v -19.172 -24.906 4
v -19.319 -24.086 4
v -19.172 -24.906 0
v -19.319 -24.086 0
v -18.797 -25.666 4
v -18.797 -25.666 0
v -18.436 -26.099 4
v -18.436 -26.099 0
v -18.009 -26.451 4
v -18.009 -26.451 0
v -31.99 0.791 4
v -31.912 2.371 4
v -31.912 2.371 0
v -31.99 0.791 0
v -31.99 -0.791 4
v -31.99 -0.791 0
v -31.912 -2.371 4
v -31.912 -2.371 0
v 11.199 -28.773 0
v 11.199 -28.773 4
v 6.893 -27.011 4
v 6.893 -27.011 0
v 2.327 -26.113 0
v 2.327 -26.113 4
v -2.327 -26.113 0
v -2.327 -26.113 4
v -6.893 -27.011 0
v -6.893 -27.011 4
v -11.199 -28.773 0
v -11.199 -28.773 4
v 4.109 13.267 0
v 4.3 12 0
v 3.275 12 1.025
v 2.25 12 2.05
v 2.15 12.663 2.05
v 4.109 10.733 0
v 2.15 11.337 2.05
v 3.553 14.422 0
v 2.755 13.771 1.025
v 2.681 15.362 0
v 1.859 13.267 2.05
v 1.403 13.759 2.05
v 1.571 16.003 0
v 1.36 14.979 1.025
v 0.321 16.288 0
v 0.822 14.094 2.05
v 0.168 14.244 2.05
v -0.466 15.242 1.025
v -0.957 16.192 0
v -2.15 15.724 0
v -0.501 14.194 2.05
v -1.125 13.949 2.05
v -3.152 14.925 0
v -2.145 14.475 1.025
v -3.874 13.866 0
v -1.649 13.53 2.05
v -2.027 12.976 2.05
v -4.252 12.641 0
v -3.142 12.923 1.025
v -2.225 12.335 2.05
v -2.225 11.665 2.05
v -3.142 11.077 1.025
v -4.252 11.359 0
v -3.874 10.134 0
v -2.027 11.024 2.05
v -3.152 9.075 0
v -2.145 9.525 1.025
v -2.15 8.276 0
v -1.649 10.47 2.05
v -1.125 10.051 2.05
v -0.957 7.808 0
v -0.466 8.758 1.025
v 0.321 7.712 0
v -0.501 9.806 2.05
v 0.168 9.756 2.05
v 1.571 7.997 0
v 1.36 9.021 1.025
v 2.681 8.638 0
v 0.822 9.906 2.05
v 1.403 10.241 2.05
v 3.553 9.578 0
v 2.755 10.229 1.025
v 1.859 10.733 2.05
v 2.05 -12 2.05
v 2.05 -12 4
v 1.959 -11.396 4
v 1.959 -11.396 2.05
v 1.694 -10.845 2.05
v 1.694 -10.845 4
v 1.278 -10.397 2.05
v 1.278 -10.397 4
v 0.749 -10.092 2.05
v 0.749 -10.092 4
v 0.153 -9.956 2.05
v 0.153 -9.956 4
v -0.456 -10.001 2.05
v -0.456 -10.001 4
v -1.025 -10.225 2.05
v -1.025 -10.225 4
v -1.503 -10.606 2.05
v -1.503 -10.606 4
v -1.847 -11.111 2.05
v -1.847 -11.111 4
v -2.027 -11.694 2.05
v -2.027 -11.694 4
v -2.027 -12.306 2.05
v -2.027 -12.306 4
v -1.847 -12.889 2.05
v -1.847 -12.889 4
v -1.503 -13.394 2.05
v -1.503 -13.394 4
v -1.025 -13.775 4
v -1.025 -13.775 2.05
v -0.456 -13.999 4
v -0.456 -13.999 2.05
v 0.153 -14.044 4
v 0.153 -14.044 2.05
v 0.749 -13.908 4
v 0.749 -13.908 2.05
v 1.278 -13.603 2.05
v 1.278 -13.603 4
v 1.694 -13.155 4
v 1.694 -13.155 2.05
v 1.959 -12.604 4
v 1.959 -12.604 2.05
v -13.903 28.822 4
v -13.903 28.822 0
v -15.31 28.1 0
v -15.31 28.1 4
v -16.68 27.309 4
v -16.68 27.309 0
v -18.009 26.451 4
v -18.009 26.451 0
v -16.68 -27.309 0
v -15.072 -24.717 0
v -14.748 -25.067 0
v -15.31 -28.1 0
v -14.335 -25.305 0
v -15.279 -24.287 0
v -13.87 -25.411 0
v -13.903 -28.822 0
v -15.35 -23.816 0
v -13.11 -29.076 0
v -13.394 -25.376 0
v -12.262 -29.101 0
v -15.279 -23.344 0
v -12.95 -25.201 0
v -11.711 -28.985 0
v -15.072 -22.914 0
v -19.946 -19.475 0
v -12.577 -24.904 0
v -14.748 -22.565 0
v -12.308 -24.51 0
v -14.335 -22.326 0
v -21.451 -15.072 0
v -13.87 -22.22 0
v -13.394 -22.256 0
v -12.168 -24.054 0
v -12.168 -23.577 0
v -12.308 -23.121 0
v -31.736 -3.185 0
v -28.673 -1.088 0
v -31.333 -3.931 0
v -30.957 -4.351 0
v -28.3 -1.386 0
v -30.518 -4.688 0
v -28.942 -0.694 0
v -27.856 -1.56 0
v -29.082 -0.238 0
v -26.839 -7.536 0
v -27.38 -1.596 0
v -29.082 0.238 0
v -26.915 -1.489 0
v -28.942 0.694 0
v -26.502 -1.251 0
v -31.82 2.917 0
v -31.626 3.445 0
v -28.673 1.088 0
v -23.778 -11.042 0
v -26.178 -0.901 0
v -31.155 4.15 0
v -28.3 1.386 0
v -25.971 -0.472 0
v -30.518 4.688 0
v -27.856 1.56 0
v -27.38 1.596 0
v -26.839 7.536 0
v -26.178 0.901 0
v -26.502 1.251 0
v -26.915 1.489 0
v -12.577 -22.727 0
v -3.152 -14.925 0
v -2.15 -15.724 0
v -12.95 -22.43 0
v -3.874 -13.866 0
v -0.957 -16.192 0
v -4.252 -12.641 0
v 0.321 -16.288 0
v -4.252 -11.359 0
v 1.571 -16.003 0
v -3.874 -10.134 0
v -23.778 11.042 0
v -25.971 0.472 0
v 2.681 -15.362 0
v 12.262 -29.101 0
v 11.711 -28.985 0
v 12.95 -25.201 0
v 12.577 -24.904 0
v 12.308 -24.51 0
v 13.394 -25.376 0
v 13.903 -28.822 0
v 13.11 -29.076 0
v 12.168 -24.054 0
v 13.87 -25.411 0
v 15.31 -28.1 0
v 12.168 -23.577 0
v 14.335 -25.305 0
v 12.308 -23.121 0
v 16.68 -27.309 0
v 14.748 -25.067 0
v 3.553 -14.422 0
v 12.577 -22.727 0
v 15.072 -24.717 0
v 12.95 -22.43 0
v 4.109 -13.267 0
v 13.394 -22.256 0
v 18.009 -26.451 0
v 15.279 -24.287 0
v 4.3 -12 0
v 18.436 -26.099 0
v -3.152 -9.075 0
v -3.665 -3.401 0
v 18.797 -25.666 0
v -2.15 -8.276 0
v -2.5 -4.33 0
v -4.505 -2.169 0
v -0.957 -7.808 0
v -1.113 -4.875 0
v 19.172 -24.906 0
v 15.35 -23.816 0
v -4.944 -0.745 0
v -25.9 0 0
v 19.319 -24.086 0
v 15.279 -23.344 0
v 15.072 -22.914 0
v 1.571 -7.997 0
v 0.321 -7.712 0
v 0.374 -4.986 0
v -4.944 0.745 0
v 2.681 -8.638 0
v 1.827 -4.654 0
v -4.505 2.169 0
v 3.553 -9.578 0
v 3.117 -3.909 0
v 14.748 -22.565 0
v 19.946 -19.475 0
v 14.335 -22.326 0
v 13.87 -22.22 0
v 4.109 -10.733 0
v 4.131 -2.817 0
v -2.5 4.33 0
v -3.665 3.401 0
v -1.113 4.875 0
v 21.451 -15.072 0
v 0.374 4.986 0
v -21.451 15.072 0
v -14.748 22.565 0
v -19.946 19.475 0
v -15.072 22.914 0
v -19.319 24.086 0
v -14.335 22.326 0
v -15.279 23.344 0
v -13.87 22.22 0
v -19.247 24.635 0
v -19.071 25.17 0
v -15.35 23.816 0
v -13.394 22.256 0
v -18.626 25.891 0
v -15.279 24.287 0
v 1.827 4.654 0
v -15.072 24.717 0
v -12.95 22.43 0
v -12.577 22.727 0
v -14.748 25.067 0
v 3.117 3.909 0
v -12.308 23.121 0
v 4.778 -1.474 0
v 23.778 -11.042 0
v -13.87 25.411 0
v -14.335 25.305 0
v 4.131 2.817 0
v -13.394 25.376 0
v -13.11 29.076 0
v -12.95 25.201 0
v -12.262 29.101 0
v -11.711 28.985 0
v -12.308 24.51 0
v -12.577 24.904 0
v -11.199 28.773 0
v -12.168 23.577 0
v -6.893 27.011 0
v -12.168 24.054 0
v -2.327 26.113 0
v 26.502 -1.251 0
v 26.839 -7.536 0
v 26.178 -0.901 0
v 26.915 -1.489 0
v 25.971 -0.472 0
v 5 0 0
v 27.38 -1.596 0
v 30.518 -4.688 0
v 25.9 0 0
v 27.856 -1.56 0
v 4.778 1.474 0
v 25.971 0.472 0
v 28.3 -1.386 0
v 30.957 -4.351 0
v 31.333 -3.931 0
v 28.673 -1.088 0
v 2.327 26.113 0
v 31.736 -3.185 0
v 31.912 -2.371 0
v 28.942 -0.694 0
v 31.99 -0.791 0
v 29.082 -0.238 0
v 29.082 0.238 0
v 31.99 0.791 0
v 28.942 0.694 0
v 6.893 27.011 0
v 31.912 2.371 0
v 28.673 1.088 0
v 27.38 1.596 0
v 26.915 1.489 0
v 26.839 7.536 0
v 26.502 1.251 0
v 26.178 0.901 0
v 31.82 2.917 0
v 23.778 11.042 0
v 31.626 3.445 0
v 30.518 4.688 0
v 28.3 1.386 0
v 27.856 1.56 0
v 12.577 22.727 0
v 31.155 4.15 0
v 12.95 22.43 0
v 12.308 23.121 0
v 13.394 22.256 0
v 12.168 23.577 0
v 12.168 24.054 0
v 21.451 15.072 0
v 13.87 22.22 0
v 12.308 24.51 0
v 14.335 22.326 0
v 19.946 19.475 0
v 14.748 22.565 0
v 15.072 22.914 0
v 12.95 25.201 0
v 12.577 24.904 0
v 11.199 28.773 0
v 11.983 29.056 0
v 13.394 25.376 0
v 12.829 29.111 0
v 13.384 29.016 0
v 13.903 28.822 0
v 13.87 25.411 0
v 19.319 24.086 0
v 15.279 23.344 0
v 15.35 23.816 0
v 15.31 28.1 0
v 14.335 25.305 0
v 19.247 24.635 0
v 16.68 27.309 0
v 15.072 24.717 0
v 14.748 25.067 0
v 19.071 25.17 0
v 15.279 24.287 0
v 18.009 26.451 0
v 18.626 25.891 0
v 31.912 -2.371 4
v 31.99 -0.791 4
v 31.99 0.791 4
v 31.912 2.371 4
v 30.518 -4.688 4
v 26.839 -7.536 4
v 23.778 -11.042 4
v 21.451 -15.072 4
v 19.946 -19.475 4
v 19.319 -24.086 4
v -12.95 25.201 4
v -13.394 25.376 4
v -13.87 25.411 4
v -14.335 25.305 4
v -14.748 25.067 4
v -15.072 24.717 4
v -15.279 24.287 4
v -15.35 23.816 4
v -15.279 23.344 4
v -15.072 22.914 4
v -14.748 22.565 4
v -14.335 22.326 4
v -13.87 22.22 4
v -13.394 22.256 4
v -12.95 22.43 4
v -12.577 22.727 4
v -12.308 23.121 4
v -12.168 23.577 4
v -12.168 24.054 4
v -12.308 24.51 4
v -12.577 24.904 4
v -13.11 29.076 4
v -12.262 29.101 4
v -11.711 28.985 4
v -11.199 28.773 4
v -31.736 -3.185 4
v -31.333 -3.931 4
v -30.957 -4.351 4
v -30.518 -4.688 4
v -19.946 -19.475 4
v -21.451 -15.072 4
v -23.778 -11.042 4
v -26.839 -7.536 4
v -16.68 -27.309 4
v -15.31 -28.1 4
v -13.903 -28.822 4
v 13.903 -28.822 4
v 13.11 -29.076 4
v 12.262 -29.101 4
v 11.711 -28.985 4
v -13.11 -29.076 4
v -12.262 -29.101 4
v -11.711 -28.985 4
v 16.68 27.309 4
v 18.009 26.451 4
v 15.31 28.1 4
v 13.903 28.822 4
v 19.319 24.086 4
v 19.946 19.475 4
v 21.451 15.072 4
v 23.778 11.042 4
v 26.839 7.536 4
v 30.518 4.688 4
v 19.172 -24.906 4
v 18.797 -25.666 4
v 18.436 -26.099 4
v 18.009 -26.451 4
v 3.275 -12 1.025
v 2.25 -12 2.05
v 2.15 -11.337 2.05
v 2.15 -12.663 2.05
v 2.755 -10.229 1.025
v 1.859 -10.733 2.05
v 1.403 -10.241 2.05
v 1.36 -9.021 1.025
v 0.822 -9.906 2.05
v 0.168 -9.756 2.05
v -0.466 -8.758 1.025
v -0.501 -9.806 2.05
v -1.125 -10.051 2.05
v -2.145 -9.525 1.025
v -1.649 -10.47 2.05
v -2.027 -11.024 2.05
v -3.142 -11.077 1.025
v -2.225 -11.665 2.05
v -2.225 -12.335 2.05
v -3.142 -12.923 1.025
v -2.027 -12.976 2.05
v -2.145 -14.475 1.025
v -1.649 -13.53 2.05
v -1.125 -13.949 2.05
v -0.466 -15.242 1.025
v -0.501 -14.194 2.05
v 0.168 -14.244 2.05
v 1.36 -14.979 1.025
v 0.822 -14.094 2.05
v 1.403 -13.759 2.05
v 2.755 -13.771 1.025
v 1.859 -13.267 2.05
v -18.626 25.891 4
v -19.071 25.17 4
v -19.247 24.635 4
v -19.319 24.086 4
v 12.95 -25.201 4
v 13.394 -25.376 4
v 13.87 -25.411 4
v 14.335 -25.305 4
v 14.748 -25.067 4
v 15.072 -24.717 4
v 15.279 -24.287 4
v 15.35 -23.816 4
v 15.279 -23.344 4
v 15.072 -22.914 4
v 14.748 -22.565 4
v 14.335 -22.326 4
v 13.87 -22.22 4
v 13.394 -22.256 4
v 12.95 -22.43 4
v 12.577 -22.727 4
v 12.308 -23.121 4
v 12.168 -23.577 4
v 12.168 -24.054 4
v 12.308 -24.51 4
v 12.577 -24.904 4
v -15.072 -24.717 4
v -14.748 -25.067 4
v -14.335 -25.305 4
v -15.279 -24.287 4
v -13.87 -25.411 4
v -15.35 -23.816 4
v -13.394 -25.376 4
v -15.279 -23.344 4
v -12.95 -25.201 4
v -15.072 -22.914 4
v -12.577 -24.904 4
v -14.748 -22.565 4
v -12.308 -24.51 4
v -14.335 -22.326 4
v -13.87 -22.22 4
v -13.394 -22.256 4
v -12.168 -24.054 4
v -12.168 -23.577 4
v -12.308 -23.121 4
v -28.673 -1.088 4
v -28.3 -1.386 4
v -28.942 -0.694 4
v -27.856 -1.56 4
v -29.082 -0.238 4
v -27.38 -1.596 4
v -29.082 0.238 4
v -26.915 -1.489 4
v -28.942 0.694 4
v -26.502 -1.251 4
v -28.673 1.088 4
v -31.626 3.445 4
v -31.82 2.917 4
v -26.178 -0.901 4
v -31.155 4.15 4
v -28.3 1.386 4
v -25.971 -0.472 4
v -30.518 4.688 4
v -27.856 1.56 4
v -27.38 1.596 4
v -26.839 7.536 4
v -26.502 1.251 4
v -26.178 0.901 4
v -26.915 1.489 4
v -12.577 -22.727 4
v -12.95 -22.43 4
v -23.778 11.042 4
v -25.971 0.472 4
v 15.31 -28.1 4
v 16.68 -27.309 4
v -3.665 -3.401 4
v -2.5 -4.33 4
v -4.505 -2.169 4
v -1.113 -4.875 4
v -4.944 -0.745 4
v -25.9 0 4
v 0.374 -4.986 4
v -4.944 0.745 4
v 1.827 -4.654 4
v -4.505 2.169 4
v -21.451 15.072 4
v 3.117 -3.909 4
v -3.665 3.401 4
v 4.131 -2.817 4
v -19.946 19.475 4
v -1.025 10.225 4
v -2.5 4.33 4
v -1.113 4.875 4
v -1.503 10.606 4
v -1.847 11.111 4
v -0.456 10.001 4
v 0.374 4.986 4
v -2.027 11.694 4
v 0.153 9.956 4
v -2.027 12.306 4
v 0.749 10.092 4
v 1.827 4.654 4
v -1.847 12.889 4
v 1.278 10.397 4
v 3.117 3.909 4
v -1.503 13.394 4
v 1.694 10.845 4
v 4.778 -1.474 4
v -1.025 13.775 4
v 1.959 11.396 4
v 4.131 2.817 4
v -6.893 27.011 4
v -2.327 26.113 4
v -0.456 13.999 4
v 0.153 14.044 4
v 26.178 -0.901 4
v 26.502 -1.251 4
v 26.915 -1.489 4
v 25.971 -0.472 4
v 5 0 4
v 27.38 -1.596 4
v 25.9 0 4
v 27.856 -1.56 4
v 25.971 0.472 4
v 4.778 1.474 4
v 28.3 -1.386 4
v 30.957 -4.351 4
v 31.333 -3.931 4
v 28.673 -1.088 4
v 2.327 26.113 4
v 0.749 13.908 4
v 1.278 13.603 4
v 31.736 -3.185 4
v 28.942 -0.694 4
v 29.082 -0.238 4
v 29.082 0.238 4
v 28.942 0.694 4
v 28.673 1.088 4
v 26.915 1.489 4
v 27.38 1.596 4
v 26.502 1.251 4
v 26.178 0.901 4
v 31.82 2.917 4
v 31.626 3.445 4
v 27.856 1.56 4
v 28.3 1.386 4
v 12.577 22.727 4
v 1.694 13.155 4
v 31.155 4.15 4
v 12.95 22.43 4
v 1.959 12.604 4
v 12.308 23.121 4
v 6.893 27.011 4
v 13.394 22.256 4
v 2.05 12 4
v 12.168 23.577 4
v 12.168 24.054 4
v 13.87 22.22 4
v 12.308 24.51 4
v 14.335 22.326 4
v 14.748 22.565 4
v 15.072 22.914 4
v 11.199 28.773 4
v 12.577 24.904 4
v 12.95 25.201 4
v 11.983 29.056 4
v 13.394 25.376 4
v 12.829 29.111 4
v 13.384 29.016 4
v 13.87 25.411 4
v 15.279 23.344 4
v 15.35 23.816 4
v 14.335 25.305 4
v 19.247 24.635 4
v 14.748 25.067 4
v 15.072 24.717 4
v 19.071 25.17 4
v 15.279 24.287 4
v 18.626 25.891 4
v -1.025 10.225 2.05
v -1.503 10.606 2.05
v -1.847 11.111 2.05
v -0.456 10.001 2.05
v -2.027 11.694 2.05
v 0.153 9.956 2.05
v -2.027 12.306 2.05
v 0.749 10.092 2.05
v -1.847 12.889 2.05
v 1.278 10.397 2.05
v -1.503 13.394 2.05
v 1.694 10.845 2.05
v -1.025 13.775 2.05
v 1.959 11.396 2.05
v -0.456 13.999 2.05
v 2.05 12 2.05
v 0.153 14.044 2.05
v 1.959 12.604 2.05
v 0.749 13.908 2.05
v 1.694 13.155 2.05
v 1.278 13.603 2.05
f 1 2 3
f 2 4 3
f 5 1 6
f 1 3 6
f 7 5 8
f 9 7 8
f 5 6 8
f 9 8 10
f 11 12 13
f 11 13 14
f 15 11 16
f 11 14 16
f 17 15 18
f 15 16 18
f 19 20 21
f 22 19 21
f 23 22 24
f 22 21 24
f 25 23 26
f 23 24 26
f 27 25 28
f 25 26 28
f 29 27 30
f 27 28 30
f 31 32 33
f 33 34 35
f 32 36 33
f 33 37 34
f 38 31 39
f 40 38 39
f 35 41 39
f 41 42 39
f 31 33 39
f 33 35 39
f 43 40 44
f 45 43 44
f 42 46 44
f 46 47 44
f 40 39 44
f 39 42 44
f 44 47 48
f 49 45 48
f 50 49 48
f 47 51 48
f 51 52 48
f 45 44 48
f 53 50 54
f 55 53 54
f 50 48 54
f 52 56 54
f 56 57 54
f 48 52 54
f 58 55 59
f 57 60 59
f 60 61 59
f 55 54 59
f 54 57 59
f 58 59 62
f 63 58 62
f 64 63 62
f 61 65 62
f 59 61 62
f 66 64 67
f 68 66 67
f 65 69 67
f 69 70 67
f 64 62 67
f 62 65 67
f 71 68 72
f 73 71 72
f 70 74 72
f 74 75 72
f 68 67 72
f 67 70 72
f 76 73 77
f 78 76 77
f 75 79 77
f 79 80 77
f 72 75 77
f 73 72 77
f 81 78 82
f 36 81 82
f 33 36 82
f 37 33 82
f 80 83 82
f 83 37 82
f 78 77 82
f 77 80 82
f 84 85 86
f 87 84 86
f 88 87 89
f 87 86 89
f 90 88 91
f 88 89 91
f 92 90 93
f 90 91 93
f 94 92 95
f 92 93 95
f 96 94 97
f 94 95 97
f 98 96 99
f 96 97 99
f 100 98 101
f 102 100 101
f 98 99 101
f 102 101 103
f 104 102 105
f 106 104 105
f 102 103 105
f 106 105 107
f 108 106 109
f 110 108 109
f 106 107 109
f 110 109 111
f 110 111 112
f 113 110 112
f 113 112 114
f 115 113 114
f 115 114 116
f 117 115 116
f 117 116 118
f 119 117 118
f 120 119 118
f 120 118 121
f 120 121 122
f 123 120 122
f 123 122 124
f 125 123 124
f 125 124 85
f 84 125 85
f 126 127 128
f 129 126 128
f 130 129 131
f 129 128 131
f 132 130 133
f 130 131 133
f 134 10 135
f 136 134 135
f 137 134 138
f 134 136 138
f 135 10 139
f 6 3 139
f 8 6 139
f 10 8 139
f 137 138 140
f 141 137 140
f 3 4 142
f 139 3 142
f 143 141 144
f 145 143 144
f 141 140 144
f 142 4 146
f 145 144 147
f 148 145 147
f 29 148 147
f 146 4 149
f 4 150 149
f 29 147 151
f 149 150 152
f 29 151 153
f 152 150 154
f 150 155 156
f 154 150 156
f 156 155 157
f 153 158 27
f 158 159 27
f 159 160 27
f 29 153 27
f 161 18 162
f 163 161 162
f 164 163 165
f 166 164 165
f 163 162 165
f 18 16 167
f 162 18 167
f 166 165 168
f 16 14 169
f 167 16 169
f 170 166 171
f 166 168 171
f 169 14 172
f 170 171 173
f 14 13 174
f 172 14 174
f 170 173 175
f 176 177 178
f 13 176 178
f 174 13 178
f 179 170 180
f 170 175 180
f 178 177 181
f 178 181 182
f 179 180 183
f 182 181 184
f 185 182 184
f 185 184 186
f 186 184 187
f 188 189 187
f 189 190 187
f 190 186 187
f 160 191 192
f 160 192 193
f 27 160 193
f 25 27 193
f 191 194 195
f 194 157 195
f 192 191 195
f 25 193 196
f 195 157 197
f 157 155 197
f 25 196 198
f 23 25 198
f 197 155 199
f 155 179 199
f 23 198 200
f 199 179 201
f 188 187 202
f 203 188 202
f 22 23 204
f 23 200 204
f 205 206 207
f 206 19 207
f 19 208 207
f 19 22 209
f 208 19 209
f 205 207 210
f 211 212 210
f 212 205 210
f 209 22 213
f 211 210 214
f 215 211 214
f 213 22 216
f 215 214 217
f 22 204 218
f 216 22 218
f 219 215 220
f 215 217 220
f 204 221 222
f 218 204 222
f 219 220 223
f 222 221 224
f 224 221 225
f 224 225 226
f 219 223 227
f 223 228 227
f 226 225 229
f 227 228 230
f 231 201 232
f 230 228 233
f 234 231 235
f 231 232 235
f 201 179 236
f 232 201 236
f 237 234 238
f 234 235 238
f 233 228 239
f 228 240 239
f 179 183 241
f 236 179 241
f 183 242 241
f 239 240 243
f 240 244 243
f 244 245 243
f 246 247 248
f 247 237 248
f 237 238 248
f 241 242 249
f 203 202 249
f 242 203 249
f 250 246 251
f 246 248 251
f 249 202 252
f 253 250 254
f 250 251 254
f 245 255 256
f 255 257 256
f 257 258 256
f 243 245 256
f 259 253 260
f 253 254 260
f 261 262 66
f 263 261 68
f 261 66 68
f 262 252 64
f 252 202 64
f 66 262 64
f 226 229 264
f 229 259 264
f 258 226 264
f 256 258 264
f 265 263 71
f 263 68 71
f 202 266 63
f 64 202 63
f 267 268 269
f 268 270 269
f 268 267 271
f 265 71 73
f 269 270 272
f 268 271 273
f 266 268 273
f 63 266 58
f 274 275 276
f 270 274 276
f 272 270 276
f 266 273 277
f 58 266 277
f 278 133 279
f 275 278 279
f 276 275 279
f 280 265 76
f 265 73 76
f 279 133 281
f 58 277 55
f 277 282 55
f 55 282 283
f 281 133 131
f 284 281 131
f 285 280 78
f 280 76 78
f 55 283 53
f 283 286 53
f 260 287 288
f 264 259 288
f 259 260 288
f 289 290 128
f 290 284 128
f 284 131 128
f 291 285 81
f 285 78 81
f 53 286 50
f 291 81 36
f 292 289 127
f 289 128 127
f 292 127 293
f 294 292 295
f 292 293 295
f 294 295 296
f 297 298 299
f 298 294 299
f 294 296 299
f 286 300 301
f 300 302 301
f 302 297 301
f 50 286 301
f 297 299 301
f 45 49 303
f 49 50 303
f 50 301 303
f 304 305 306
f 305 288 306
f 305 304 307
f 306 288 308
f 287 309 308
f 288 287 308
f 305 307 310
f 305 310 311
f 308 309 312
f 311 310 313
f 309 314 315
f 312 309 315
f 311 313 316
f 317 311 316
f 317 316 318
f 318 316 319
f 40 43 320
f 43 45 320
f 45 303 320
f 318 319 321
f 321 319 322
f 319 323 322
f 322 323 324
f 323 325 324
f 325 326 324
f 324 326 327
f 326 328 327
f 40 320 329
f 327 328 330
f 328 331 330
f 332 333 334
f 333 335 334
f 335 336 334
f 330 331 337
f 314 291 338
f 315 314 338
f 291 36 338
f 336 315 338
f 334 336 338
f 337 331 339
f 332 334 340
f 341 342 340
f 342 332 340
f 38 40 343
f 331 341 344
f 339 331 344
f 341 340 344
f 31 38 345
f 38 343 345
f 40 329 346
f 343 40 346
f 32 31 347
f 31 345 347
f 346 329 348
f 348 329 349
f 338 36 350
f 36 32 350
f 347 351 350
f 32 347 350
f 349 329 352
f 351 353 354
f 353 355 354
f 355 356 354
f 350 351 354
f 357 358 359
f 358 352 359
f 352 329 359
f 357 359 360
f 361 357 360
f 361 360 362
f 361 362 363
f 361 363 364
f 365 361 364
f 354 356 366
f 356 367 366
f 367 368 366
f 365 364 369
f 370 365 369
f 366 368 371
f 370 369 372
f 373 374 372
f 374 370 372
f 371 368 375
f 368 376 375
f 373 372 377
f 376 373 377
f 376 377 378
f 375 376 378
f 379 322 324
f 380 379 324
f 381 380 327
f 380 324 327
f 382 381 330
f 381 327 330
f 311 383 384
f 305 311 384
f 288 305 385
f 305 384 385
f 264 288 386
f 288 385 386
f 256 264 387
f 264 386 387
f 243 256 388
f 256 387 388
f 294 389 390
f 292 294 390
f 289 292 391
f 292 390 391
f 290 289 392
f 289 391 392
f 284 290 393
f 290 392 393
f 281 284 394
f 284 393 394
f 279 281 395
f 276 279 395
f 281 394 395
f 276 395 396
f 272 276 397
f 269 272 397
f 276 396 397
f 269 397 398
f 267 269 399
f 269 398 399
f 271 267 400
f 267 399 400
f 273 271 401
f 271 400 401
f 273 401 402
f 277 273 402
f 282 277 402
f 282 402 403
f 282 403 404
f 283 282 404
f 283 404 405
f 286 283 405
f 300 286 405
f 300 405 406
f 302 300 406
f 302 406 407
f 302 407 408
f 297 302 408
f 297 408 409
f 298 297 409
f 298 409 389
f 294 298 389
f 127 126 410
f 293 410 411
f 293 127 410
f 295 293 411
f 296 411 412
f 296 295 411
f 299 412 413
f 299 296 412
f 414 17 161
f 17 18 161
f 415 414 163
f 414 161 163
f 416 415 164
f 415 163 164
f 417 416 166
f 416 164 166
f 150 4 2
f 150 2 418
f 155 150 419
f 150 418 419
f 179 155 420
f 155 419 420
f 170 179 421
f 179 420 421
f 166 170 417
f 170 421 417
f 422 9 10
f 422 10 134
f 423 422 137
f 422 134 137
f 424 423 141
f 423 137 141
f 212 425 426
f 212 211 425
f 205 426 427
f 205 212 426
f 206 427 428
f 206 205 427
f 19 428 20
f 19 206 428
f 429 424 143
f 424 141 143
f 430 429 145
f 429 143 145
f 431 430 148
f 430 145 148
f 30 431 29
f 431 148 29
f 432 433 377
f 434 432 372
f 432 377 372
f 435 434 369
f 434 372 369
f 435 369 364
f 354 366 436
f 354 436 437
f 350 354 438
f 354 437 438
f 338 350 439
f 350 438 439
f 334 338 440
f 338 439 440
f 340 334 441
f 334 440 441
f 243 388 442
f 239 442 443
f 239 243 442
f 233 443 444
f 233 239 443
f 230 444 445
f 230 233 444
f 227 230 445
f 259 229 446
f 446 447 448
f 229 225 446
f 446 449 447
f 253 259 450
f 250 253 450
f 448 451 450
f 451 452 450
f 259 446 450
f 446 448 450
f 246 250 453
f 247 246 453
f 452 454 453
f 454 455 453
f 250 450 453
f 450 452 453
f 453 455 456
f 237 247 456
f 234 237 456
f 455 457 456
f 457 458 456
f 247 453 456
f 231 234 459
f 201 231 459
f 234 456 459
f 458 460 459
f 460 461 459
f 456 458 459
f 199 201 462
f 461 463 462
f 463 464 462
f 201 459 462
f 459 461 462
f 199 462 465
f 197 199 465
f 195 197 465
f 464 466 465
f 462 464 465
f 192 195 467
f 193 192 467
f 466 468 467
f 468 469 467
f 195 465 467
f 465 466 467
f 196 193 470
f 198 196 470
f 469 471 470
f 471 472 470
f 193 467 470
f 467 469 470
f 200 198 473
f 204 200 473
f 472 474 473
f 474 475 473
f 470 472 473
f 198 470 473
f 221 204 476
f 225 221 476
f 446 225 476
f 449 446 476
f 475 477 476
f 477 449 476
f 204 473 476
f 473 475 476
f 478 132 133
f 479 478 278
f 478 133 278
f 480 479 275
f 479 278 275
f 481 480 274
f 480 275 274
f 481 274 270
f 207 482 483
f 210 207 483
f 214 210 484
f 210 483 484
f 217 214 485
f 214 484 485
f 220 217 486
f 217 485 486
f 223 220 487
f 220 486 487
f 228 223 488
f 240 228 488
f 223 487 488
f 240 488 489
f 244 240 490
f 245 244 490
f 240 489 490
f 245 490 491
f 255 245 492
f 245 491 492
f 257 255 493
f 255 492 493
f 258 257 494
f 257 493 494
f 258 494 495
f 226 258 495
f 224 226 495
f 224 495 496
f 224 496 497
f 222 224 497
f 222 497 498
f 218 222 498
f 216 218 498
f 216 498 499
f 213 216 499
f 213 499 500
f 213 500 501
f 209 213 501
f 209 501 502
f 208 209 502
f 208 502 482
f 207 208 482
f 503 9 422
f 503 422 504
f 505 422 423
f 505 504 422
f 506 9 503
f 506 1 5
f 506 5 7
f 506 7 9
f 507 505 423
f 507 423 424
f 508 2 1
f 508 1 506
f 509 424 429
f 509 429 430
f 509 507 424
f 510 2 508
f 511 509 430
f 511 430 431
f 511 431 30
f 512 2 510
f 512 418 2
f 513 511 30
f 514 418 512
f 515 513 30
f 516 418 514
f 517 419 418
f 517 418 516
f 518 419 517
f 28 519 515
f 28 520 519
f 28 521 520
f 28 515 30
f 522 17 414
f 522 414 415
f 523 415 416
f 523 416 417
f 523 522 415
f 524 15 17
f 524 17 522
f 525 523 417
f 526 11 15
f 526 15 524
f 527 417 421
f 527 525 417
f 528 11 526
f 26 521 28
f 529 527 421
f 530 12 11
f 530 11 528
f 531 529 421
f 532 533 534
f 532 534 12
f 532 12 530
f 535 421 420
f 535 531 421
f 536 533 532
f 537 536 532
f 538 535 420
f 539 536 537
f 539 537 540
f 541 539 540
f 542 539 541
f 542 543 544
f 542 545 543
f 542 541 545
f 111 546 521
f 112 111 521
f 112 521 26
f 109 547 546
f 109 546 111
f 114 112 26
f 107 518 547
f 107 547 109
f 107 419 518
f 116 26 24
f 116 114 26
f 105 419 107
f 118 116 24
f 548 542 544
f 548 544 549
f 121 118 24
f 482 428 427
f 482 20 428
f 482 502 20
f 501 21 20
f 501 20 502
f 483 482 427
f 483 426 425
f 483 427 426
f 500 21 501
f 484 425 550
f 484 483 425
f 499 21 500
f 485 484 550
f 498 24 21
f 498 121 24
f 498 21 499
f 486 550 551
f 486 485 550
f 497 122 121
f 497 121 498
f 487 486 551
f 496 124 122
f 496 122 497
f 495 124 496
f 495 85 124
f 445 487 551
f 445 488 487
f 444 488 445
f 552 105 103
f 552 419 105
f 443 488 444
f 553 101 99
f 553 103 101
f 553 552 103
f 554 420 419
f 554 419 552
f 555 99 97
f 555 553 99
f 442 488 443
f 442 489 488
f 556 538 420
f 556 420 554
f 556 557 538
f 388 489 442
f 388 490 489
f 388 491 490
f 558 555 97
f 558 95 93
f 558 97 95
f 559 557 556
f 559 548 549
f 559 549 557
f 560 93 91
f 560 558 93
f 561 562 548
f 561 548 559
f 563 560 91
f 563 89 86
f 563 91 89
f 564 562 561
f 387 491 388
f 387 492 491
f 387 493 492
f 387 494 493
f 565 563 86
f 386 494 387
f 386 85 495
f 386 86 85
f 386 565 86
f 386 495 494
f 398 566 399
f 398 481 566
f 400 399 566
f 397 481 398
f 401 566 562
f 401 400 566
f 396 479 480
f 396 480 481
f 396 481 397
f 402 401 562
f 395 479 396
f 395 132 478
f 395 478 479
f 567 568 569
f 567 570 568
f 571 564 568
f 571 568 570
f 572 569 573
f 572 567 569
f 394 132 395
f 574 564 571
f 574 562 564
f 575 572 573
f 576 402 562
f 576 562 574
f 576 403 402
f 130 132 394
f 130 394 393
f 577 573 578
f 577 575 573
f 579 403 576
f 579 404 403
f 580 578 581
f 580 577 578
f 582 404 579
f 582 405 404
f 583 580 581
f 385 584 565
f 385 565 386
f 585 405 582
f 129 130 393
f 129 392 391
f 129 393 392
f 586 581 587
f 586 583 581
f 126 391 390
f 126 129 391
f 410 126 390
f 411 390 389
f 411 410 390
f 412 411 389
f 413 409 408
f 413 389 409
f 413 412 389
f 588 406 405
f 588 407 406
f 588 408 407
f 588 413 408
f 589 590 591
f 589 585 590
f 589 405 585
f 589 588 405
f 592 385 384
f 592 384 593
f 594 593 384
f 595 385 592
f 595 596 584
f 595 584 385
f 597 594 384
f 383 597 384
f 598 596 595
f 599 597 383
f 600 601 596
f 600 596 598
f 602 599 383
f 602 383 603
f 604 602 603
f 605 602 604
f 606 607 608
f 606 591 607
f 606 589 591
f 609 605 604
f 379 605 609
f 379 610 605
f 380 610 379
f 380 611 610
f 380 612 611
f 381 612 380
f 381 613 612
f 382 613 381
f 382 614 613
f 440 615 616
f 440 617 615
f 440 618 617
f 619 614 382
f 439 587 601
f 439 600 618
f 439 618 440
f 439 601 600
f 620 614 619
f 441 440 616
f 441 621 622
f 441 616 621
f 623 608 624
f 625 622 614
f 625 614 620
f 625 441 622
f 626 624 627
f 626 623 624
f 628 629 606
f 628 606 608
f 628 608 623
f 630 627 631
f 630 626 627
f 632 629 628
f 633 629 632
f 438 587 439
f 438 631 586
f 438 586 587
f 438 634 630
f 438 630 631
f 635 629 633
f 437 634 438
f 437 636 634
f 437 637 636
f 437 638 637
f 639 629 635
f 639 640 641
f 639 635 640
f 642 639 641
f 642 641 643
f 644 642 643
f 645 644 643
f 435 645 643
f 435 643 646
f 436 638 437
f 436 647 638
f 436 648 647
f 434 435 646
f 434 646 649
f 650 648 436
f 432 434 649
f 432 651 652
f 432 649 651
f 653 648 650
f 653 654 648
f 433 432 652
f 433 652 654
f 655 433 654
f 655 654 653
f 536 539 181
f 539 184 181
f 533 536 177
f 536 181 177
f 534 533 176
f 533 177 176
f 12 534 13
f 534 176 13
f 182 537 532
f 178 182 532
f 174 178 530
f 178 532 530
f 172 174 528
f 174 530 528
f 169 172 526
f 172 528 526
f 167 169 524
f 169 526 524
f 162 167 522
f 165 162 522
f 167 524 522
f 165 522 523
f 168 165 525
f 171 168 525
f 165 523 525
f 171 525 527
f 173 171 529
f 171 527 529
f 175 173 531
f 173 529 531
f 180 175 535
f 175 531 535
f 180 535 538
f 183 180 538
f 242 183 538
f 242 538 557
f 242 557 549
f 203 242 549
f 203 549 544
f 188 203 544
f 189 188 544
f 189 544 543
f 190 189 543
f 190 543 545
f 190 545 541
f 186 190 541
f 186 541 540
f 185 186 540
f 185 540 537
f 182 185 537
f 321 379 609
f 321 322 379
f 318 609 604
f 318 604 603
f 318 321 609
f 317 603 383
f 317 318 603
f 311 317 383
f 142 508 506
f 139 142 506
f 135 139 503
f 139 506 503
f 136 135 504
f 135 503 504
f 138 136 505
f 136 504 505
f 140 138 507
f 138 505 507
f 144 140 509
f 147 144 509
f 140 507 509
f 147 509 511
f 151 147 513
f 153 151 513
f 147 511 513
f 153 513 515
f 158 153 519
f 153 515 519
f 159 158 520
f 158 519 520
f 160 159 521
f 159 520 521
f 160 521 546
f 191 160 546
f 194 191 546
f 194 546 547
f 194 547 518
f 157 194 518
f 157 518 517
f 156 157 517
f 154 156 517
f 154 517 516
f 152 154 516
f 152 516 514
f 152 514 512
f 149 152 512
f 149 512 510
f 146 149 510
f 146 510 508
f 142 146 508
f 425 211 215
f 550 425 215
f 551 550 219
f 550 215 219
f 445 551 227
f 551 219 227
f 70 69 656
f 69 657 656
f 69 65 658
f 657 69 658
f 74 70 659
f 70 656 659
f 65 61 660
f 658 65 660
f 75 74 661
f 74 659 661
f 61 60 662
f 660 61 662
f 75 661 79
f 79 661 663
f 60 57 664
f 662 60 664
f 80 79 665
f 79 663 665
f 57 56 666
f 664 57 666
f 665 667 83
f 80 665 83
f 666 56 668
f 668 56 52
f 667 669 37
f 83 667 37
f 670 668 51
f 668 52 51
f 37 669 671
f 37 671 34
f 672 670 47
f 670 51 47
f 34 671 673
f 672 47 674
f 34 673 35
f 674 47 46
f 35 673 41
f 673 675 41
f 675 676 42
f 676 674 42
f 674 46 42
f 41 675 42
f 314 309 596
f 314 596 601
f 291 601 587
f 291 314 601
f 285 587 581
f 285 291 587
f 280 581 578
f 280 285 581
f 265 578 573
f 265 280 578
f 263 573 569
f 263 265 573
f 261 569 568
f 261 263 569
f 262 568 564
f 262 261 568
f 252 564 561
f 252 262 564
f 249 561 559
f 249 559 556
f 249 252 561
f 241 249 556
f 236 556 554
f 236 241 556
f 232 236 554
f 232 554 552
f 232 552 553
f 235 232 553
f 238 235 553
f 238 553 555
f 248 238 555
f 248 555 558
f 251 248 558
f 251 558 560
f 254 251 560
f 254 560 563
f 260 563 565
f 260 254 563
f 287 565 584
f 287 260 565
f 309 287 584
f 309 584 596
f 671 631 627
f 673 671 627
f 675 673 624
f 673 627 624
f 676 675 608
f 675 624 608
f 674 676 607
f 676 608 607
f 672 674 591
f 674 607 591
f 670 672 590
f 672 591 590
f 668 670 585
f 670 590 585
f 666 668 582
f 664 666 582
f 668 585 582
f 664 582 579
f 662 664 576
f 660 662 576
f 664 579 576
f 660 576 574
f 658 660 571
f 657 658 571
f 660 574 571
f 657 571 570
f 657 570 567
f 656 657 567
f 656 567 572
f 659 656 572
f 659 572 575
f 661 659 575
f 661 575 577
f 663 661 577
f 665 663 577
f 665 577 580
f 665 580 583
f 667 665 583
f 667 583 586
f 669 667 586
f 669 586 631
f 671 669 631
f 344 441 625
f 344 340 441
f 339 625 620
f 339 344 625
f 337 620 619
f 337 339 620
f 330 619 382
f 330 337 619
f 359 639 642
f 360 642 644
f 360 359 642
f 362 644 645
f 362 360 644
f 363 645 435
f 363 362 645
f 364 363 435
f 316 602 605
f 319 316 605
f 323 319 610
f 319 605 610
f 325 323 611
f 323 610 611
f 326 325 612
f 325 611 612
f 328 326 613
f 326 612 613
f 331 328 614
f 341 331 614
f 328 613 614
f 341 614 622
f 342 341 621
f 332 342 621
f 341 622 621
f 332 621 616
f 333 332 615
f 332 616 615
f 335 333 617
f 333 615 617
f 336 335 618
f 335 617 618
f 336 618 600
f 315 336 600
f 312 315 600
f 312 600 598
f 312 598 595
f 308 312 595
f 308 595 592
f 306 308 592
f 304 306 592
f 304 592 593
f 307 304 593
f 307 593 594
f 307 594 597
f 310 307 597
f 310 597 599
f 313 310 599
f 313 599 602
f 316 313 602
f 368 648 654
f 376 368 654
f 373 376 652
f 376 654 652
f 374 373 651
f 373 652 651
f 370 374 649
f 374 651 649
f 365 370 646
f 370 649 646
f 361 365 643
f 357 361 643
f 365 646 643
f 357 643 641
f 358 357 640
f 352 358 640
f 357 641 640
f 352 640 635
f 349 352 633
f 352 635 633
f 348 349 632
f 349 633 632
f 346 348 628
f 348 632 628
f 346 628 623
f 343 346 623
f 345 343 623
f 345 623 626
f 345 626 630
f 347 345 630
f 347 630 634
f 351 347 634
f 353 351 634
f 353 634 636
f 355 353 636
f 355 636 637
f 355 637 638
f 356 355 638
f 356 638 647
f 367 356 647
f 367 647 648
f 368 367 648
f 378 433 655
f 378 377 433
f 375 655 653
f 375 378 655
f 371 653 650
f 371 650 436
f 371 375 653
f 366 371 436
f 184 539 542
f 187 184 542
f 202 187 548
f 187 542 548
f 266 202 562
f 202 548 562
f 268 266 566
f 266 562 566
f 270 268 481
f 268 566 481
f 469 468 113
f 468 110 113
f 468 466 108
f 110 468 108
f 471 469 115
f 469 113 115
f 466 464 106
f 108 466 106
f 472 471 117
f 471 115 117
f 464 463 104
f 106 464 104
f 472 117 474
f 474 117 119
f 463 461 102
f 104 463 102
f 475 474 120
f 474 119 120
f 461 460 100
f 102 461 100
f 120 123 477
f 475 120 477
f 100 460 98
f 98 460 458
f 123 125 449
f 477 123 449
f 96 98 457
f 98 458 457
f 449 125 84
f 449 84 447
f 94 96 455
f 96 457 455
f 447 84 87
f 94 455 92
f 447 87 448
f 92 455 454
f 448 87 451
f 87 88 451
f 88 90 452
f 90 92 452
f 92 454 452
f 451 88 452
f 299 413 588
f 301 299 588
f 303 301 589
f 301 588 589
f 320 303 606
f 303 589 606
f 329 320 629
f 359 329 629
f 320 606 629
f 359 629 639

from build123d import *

# Parameters (mm, degrees)
SKETCH_1_R               = 32
SKETCH_1_R_2             = 5
EXTRUDE_1_DEPTH          = 4
SKETCH_2_R               = 2.05
CUT_EXTRUDE_1_DEPTH      = 5
SKETCH_3_R               = 24
CUT_EXTRUDE_2_DEPTH      = 10
PATTERN_CIRCULAR_1_COUNT = 6
SKETCH_4_R               = 1.6
CUT_EXTRUDE_3_DEPTH      = 23
PATTERN_CIRCULAR_2_COUNT = 6
FILLET_1_R               = 3


# Read off the part's stored shape, not the designer's step: 高级异型孔2
with BuildPart() as part:
    # 草图1 → 凸台-拉伸1 (new body)
    with BuildSketch(Plane.XY):
        Circle(SKETCH_1_R)
        Circle(SKETCH_1_R_2, mode=Mode.SUBTRACT)
    extrude(amount=EXTRUDE_1_DEPTH)

    # 草图2 → 切除-拉伸1 (cut)
    with BuildSketch(Plane.XY.offset(4)):
        with Locations((0, 12)):
            Circle(SKETCH_2_R)
        with Locations((0, -12)):
            Circle(SKETCH_2_R)
    extrude(amount=-CUT_EXTRUDE_1_DEPTH, mode=Mode.SUBTRACT)

    # 草图3 → 切除-拉伸2 (cut)
    with BuildSketch(Plane.XY.offset(4)):
        with Locations((0, 50)):
            Circle(SKETCH_3_R)
    cut_extrude_2 = extrude(amount=-CUT_EXTRUDE_2_DEPTH, mode=Mode.SUBTRACT)

    # 阵列(圆周)1: 切除-拉伸2 ×6 about axis
    pattern_circular_1_axis = Axis((0, 0, 0), (0, 0, 1))
    for i in range(1, PATTERN_CIRCULAR_1_COUNT):
        add(cut_extrude_2.rotate(pattern_circular_1_axis, i * 360 / PATTERN_CIRCULAR_1_COUNT), mode=Mode.SUBTRACT)

    # 草图4 → 切除-拉伸3 (cut)
    with BuildSketch(Plane.XY.offset(4)):
        with Locations((13.75, 23.815698604)):
            Circle(SKETCH_4_R)
    cut_extrude_3 = extrude(amount=-CUT_EXTRUDE_3_DEPTH, mode=Mode.SUBTRACT)

    # 阵列(圆周)2: 切除-拉伸3 ×6 about axis
    pattern_circular_2_axis = Axis((0, 0, 0), (0, 0, 1))
    for i in range(1, PATTERN_CIRCULAR_2_COUNT):
        add(cut_extrude_3.rotate(pattern_circular_2_axis, i * 360 / PATTERN_CIRCULAR_2_COUNT), mode=Mode.SUBTRACT)

    # 圆角1
    fillet_1_edges = [part.edges().sort_by_distance(p)[0] for p in [
        (-12.447071945, 29.48, 2),
        (12.447071945, 29.48, 2),
        (-31.753964876, 3.960519493, 2),
        (-19.306892931, 25.519480507, 2),
        (19.306892931, 25.519480507, 2),
        (31.753964876, 3.960519493, 2),
        (31.753964876, -3.960519493, 2),
        (19.306892931, -25.519480507, 2),
        (-19.306892931, -25.519480507, 2),
        (-31.753964876, -3.960519493, 2),
        (12.447071945, -29.48, 2),
        (-12.447071945, -29.48, 2),
    ]]
    fillet(fillet_1_edges, radius=FILLET_1_R)

    # 高级异型孔2 outline → 高级异型孔2 (revolve, cut)
    with BuildSketch(Plane.XZ.offset(12)):
        Polygon((2.25, 2.05), (2.05, 2.05), (2.05, 0), (4.3, 0), align=None)
    revolve(axis=Axis((0, -12, 0), (0, 0, 1)), mode=Mode.SUBTRACT)

    # Other 2 2 outline → Other 2 2 (revolve, cut)
    with BuildSketch(Plane.XZ.offset(-12)):
        Polygon((2.25, 2.05), (2.05, 2.05), (2.05, 0), (4.3, 0), align=None)
    revolve(axis=Axis((0, 12, 0), (0, 0, 1)), mode=Mode.SUBTRACT)


solid = part.part
